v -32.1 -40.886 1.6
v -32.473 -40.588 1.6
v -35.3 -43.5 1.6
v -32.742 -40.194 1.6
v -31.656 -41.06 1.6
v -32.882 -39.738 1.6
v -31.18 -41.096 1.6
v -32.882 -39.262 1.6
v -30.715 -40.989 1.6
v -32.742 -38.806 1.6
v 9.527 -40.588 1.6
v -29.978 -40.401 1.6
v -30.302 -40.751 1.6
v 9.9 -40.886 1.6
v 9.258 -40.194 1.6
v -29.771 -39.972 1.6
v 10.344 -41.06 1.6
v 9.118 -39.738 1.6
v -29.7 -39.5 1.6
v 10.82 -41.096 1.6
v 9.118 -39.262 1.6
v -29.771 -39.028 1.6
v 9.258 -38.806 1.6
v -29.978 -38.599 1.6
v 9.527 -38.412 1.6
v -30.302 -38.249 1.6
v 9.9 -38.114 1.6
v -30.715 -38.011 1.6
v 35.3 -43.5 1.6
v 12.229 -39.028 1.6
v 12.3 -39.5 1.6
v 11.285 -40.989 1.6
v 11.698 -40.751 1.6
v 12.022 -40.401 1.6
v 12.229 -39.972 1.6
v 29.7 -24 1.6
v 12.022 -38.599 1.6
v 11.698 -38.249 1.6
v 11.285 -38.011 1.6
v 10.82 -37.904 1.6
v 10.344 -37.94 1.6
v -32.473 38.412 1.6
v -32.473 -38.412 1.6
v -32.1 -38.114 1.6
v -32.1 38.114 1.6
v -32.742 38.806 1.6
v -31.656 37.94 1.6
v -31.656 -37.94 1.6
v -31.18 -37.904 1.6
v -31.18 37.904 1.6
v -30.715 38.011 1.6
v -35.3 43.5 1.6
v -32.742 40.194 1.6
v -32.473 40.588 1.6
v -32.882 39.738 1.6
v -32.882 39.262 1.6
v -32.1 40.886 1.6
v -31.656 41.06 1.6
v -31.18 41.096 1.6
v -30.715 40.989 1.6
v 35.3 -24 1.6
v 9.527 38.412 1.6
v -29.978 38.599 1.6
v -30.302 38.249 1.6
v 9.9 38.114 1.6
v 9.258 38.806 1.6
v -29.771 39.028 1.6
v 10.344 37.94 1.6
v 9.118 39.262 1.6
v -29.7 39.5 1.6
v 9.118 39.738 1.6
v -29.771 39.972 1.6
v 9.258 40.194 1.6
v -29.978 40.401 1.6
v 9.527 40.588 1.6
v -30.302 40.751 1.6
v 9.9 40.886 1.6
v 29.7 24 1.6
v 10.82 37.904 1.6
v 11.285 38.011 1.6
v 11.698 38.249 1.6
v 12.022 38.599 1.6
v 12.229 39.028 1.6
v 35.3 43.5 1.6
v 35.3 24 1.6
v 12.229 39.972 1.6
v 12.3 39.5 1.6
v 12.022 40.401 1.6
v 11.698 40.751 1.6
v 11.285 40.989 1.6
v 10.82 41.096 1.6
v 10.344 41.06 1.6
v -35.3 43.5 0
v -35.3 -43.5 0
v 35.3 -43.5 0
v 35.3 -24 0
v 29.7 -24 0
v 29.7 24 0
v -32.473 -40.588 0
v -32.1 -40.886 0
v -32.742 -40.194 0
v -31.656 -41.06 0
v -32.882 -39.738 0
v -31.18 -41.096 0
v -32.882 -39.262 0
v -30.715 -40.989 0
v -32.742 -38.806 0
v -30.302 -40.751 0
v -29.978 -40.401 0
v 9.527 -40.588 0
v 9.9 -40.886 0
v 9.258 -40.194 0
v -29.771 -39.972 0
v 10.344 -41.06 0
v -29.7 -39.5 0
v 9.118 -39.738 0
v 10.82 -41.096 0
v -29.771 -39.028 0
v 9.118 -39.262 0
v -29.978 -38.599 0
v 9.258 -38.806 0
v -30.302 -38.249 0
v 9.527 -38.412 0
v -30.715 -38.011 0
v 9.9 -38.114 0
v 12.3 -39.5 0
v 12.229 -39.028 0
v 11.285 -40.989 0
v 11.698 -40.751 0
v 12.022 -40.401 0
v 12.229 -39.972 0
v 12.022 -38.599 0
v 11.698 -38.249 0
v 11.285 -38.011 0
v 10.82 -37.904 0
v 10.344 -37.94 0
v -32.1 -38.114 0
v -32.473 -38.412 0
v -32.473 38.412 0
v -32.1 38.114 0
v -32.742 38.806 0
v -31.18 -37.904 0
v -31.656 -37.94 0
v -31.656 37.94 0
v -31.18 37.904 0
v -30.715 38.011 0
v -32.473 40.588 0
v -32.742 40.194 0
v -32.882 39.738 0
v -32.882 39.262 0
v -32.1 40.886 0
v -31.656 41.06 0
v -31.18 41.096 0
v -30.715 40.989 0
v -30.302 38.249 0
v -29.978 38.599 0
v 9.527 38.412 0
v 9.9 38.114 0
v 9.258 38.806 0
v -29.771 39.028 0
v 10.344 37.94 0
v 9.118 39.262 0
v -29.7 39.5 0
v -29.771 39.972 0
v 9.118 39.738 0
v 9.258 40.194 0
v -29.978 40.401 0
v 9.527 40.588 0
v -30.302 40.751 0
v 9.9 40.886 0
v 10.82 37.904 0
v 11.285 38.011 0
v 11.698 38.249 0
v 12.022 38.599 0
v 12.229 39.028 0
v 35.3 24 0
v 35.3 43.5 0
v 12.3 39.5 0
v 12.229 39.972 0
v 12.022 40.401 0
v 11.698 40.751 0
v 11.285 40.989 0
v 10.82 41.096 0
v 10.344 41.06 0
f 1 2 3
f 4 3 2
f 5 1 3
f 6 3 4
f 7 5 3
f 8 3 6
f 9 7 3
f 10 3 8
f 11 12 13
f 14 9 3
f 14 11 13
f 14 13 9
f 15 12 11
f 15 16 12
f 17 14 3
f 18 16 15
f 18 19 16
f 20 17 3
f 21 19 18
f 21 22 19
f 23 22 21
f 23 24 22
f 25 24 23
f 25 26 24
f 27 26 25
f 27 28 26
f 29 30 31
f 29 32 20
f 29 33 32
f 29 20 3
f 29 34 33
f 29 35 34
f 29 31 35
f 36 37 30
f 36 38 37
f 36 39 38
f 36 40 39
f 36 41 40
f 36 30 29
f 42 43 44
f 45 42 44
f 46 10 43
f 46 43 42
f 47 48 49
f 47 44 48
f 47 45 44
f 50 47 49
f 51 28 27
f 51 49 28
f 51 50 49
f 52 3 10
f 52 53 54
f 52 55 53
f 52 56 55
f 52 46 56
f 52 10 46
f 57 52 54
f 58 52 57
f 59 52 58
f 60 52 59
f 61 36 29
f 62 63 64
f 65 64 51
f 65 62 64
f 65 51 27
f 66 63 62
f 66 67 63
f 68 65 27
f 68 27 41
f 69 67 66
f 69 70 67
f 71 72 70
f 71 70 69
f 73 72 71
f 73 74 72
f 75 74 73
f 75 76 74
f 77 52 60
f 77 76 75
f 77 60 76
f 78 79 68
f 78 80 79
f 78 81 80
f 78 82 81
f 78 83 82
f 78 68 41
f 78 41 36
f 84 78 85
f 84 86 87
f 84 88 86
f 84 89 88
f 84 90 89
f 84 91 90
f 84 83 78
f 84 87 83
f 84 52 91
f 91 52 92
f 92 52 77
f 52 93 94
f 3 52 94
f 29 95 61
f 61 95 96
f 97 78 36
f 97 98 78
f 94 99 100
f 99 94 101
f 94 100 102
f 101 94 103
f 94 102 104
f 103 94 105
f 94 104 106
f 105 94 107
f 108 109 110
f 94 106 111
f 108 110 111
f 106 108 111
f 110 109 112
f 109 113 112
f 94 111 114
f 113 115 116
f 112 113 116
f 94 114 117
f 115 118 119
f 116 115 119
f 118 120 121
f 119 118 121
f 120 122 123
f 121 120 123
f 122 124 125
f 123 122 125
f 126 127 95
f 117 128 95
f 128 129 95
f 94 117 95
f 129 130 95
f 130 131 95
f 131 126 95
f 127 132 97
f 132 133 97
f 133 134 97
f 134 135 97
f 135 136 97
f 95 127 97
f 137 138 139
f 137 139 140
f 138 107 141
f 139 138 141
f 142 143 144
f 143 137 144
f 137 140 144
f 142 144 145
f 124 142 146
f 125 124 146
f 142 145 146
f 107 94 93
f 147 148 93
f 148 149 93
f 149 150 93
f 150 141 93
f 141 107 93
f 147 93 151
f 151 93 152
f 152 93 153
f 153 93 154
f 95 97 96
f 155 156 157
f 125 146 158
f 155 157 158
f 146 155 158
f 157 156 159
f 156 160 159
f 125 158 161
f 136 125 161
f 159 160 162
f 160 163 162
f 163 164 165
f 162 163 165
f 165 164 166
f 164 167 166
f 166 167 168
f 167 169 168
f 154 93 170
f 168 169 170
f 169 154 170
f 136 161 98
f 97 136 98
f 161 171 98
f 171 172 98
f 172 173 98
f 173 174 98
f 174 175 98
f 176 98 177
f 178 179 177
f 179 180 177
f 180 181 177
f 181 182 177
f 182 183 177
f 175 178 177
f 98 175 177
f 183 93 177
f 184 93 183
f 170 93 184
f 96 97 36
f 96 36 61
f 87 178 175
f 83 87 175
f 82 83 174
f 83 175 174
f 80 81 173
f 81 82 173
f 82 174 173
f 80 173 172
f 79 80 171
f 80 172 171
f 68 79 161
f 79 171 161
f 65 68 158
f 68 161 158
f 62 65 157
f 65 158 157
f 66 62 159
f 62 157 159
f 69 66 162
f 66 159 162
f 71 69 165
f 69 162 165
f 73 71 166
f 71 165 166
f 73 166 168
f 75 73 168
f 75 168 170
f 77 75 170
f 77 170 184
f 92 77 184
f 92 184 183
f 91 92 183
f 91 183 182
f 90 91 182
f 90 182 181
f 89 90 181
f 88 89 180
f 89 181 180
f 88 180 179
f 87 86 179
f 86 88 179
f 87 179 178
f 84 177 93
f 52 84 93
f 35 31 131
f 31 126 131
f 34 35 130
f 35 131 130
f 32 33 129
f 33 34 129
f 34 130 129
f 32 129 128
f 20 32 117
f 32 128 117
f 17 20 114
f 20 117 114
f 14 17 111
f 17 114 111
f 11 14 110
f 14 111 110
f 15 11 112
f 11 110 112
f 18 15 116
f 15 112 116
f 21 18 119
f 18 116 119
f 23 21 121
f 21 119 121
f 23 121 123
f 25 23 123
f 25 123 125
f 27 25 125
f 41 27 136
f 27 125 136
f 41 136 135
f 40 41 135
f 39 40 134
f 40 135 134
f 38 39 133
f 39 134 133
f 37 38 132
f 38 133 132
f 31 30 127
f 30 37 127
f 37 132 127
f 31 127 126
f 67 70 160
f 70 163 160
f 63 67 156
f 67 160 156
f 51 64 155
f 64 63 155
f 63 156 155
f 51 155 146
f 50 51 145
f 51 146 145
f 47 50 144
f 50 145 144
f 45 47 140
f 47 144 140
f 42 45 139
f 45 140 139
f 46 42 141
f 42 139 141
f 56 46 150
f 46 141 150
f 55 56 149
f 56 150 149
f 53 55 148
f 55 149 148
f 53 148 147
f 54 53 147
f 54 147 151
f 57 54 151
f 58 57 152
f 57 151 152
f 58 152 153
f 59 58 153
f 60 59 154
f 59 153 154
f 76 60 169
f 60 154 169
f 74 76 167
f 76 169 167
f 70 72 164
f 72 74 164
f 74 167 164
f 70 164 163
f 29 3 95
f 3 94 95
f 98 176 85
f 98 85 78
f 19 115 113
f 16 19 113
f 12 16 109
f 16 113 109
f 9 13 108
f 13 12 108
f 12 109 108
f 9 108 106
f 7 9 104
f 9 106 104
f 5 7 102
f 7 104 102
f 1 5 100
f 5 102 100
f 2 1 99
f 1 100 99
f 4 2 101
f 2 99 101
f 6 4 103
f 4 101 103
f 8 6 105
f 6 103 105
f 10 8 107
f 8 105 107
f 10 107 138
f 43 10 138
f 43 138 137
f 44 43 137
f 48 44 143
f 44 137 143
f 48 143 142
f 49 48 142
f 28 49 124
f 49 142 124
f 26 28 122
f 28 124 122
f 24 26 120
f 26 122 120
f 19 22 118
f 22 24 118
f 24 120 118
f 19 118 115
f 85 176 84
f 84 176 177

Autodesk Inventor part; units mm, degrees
ref_plane "YZ Plane" through (0, 0, 0) normal (1, 0, 0) x (0, 1, 0)
ref_plane "XZ Plane" through (0, 0, 0) normal (0, 1, 0) x (-1, 0, 0)
ref_plane "XY Plane" through (0, 0, 0) normal (0, 0, 1) x (1, 0, 0)
sketch "スケッチ1" plane through (0, 0, 0) normal (0, 0, 1) x (1, 0, 0)
  line L0 (35.3, 43.5) -> (-35.3, 43.5)
  line L1 (-35.3, 43.5) -> (-35.3, -43.5)
  line L2 (-35.3, -43.5) -> (35.3, -43.5)
  line L3 (35.3, -43.5) -> (35.3, 43.5)
  line L4 (35.3, 43.5) -> (-35.3, -43.5) construction
  line L5 (-35.3, 43.5) -> (35.3, -43.5) construction
  line L6 (35.3, 24) -> (29.7, 24)
  line L7 (29.7, 24) -> (29.7, -24)
  line L8 (29.7, -24) -> (35.3, -24)
  line L9 (35.3, 0) -> (-35.3, 0) construction
  line L10 (10.7, -39.5) -> (-31.3, -39.5) construction
  line L11 (-31.3, -39.5) -> (-31.3, 39.5) construction
  line L12 (-31.3, 39.5) -> (10.7, 39.5) construction
  line L13 (10.7, 39.5) -> (10.7, -39.5) construction
  line L14 (10.7, -39.5) -> (-31.3, 39.5) construction
  line L15 (-31.3, -39.5) -> (10.7, 39.5) construction
  circle A0 centre (-31.3, 39.5) radius 1.6
  circle A1 centre (10.7, 39.5) radius 1.6
  circle A2 centre (-31.3, -39.5) radius 1.6
  circle A3 centre (10.7, -39.5) radius 1.6
  point P0 (0, 0)
  point P1 (-10.3, 0)
  dimension "d0" = 70.6
  dimension "d1" = 87
  dimension "d2" = 19.5
  dimension "d3" = 48
  dimension "d4" = 65
  dimension "d5" = 4
  dimension "d6" = 4
  dimension "d7" = 46
  dimension "d8" = 3.2
  dimension "d9" = 3.2
extrude "押し出し1" add sketch "スケッチ1" along normal blind 1.6 contours L3 L6 L7 L8 L2 L1 L0
equation "\"d9\" = d8"
properties part number "EN715_with_JetsonXavierNX_and_Fan"
